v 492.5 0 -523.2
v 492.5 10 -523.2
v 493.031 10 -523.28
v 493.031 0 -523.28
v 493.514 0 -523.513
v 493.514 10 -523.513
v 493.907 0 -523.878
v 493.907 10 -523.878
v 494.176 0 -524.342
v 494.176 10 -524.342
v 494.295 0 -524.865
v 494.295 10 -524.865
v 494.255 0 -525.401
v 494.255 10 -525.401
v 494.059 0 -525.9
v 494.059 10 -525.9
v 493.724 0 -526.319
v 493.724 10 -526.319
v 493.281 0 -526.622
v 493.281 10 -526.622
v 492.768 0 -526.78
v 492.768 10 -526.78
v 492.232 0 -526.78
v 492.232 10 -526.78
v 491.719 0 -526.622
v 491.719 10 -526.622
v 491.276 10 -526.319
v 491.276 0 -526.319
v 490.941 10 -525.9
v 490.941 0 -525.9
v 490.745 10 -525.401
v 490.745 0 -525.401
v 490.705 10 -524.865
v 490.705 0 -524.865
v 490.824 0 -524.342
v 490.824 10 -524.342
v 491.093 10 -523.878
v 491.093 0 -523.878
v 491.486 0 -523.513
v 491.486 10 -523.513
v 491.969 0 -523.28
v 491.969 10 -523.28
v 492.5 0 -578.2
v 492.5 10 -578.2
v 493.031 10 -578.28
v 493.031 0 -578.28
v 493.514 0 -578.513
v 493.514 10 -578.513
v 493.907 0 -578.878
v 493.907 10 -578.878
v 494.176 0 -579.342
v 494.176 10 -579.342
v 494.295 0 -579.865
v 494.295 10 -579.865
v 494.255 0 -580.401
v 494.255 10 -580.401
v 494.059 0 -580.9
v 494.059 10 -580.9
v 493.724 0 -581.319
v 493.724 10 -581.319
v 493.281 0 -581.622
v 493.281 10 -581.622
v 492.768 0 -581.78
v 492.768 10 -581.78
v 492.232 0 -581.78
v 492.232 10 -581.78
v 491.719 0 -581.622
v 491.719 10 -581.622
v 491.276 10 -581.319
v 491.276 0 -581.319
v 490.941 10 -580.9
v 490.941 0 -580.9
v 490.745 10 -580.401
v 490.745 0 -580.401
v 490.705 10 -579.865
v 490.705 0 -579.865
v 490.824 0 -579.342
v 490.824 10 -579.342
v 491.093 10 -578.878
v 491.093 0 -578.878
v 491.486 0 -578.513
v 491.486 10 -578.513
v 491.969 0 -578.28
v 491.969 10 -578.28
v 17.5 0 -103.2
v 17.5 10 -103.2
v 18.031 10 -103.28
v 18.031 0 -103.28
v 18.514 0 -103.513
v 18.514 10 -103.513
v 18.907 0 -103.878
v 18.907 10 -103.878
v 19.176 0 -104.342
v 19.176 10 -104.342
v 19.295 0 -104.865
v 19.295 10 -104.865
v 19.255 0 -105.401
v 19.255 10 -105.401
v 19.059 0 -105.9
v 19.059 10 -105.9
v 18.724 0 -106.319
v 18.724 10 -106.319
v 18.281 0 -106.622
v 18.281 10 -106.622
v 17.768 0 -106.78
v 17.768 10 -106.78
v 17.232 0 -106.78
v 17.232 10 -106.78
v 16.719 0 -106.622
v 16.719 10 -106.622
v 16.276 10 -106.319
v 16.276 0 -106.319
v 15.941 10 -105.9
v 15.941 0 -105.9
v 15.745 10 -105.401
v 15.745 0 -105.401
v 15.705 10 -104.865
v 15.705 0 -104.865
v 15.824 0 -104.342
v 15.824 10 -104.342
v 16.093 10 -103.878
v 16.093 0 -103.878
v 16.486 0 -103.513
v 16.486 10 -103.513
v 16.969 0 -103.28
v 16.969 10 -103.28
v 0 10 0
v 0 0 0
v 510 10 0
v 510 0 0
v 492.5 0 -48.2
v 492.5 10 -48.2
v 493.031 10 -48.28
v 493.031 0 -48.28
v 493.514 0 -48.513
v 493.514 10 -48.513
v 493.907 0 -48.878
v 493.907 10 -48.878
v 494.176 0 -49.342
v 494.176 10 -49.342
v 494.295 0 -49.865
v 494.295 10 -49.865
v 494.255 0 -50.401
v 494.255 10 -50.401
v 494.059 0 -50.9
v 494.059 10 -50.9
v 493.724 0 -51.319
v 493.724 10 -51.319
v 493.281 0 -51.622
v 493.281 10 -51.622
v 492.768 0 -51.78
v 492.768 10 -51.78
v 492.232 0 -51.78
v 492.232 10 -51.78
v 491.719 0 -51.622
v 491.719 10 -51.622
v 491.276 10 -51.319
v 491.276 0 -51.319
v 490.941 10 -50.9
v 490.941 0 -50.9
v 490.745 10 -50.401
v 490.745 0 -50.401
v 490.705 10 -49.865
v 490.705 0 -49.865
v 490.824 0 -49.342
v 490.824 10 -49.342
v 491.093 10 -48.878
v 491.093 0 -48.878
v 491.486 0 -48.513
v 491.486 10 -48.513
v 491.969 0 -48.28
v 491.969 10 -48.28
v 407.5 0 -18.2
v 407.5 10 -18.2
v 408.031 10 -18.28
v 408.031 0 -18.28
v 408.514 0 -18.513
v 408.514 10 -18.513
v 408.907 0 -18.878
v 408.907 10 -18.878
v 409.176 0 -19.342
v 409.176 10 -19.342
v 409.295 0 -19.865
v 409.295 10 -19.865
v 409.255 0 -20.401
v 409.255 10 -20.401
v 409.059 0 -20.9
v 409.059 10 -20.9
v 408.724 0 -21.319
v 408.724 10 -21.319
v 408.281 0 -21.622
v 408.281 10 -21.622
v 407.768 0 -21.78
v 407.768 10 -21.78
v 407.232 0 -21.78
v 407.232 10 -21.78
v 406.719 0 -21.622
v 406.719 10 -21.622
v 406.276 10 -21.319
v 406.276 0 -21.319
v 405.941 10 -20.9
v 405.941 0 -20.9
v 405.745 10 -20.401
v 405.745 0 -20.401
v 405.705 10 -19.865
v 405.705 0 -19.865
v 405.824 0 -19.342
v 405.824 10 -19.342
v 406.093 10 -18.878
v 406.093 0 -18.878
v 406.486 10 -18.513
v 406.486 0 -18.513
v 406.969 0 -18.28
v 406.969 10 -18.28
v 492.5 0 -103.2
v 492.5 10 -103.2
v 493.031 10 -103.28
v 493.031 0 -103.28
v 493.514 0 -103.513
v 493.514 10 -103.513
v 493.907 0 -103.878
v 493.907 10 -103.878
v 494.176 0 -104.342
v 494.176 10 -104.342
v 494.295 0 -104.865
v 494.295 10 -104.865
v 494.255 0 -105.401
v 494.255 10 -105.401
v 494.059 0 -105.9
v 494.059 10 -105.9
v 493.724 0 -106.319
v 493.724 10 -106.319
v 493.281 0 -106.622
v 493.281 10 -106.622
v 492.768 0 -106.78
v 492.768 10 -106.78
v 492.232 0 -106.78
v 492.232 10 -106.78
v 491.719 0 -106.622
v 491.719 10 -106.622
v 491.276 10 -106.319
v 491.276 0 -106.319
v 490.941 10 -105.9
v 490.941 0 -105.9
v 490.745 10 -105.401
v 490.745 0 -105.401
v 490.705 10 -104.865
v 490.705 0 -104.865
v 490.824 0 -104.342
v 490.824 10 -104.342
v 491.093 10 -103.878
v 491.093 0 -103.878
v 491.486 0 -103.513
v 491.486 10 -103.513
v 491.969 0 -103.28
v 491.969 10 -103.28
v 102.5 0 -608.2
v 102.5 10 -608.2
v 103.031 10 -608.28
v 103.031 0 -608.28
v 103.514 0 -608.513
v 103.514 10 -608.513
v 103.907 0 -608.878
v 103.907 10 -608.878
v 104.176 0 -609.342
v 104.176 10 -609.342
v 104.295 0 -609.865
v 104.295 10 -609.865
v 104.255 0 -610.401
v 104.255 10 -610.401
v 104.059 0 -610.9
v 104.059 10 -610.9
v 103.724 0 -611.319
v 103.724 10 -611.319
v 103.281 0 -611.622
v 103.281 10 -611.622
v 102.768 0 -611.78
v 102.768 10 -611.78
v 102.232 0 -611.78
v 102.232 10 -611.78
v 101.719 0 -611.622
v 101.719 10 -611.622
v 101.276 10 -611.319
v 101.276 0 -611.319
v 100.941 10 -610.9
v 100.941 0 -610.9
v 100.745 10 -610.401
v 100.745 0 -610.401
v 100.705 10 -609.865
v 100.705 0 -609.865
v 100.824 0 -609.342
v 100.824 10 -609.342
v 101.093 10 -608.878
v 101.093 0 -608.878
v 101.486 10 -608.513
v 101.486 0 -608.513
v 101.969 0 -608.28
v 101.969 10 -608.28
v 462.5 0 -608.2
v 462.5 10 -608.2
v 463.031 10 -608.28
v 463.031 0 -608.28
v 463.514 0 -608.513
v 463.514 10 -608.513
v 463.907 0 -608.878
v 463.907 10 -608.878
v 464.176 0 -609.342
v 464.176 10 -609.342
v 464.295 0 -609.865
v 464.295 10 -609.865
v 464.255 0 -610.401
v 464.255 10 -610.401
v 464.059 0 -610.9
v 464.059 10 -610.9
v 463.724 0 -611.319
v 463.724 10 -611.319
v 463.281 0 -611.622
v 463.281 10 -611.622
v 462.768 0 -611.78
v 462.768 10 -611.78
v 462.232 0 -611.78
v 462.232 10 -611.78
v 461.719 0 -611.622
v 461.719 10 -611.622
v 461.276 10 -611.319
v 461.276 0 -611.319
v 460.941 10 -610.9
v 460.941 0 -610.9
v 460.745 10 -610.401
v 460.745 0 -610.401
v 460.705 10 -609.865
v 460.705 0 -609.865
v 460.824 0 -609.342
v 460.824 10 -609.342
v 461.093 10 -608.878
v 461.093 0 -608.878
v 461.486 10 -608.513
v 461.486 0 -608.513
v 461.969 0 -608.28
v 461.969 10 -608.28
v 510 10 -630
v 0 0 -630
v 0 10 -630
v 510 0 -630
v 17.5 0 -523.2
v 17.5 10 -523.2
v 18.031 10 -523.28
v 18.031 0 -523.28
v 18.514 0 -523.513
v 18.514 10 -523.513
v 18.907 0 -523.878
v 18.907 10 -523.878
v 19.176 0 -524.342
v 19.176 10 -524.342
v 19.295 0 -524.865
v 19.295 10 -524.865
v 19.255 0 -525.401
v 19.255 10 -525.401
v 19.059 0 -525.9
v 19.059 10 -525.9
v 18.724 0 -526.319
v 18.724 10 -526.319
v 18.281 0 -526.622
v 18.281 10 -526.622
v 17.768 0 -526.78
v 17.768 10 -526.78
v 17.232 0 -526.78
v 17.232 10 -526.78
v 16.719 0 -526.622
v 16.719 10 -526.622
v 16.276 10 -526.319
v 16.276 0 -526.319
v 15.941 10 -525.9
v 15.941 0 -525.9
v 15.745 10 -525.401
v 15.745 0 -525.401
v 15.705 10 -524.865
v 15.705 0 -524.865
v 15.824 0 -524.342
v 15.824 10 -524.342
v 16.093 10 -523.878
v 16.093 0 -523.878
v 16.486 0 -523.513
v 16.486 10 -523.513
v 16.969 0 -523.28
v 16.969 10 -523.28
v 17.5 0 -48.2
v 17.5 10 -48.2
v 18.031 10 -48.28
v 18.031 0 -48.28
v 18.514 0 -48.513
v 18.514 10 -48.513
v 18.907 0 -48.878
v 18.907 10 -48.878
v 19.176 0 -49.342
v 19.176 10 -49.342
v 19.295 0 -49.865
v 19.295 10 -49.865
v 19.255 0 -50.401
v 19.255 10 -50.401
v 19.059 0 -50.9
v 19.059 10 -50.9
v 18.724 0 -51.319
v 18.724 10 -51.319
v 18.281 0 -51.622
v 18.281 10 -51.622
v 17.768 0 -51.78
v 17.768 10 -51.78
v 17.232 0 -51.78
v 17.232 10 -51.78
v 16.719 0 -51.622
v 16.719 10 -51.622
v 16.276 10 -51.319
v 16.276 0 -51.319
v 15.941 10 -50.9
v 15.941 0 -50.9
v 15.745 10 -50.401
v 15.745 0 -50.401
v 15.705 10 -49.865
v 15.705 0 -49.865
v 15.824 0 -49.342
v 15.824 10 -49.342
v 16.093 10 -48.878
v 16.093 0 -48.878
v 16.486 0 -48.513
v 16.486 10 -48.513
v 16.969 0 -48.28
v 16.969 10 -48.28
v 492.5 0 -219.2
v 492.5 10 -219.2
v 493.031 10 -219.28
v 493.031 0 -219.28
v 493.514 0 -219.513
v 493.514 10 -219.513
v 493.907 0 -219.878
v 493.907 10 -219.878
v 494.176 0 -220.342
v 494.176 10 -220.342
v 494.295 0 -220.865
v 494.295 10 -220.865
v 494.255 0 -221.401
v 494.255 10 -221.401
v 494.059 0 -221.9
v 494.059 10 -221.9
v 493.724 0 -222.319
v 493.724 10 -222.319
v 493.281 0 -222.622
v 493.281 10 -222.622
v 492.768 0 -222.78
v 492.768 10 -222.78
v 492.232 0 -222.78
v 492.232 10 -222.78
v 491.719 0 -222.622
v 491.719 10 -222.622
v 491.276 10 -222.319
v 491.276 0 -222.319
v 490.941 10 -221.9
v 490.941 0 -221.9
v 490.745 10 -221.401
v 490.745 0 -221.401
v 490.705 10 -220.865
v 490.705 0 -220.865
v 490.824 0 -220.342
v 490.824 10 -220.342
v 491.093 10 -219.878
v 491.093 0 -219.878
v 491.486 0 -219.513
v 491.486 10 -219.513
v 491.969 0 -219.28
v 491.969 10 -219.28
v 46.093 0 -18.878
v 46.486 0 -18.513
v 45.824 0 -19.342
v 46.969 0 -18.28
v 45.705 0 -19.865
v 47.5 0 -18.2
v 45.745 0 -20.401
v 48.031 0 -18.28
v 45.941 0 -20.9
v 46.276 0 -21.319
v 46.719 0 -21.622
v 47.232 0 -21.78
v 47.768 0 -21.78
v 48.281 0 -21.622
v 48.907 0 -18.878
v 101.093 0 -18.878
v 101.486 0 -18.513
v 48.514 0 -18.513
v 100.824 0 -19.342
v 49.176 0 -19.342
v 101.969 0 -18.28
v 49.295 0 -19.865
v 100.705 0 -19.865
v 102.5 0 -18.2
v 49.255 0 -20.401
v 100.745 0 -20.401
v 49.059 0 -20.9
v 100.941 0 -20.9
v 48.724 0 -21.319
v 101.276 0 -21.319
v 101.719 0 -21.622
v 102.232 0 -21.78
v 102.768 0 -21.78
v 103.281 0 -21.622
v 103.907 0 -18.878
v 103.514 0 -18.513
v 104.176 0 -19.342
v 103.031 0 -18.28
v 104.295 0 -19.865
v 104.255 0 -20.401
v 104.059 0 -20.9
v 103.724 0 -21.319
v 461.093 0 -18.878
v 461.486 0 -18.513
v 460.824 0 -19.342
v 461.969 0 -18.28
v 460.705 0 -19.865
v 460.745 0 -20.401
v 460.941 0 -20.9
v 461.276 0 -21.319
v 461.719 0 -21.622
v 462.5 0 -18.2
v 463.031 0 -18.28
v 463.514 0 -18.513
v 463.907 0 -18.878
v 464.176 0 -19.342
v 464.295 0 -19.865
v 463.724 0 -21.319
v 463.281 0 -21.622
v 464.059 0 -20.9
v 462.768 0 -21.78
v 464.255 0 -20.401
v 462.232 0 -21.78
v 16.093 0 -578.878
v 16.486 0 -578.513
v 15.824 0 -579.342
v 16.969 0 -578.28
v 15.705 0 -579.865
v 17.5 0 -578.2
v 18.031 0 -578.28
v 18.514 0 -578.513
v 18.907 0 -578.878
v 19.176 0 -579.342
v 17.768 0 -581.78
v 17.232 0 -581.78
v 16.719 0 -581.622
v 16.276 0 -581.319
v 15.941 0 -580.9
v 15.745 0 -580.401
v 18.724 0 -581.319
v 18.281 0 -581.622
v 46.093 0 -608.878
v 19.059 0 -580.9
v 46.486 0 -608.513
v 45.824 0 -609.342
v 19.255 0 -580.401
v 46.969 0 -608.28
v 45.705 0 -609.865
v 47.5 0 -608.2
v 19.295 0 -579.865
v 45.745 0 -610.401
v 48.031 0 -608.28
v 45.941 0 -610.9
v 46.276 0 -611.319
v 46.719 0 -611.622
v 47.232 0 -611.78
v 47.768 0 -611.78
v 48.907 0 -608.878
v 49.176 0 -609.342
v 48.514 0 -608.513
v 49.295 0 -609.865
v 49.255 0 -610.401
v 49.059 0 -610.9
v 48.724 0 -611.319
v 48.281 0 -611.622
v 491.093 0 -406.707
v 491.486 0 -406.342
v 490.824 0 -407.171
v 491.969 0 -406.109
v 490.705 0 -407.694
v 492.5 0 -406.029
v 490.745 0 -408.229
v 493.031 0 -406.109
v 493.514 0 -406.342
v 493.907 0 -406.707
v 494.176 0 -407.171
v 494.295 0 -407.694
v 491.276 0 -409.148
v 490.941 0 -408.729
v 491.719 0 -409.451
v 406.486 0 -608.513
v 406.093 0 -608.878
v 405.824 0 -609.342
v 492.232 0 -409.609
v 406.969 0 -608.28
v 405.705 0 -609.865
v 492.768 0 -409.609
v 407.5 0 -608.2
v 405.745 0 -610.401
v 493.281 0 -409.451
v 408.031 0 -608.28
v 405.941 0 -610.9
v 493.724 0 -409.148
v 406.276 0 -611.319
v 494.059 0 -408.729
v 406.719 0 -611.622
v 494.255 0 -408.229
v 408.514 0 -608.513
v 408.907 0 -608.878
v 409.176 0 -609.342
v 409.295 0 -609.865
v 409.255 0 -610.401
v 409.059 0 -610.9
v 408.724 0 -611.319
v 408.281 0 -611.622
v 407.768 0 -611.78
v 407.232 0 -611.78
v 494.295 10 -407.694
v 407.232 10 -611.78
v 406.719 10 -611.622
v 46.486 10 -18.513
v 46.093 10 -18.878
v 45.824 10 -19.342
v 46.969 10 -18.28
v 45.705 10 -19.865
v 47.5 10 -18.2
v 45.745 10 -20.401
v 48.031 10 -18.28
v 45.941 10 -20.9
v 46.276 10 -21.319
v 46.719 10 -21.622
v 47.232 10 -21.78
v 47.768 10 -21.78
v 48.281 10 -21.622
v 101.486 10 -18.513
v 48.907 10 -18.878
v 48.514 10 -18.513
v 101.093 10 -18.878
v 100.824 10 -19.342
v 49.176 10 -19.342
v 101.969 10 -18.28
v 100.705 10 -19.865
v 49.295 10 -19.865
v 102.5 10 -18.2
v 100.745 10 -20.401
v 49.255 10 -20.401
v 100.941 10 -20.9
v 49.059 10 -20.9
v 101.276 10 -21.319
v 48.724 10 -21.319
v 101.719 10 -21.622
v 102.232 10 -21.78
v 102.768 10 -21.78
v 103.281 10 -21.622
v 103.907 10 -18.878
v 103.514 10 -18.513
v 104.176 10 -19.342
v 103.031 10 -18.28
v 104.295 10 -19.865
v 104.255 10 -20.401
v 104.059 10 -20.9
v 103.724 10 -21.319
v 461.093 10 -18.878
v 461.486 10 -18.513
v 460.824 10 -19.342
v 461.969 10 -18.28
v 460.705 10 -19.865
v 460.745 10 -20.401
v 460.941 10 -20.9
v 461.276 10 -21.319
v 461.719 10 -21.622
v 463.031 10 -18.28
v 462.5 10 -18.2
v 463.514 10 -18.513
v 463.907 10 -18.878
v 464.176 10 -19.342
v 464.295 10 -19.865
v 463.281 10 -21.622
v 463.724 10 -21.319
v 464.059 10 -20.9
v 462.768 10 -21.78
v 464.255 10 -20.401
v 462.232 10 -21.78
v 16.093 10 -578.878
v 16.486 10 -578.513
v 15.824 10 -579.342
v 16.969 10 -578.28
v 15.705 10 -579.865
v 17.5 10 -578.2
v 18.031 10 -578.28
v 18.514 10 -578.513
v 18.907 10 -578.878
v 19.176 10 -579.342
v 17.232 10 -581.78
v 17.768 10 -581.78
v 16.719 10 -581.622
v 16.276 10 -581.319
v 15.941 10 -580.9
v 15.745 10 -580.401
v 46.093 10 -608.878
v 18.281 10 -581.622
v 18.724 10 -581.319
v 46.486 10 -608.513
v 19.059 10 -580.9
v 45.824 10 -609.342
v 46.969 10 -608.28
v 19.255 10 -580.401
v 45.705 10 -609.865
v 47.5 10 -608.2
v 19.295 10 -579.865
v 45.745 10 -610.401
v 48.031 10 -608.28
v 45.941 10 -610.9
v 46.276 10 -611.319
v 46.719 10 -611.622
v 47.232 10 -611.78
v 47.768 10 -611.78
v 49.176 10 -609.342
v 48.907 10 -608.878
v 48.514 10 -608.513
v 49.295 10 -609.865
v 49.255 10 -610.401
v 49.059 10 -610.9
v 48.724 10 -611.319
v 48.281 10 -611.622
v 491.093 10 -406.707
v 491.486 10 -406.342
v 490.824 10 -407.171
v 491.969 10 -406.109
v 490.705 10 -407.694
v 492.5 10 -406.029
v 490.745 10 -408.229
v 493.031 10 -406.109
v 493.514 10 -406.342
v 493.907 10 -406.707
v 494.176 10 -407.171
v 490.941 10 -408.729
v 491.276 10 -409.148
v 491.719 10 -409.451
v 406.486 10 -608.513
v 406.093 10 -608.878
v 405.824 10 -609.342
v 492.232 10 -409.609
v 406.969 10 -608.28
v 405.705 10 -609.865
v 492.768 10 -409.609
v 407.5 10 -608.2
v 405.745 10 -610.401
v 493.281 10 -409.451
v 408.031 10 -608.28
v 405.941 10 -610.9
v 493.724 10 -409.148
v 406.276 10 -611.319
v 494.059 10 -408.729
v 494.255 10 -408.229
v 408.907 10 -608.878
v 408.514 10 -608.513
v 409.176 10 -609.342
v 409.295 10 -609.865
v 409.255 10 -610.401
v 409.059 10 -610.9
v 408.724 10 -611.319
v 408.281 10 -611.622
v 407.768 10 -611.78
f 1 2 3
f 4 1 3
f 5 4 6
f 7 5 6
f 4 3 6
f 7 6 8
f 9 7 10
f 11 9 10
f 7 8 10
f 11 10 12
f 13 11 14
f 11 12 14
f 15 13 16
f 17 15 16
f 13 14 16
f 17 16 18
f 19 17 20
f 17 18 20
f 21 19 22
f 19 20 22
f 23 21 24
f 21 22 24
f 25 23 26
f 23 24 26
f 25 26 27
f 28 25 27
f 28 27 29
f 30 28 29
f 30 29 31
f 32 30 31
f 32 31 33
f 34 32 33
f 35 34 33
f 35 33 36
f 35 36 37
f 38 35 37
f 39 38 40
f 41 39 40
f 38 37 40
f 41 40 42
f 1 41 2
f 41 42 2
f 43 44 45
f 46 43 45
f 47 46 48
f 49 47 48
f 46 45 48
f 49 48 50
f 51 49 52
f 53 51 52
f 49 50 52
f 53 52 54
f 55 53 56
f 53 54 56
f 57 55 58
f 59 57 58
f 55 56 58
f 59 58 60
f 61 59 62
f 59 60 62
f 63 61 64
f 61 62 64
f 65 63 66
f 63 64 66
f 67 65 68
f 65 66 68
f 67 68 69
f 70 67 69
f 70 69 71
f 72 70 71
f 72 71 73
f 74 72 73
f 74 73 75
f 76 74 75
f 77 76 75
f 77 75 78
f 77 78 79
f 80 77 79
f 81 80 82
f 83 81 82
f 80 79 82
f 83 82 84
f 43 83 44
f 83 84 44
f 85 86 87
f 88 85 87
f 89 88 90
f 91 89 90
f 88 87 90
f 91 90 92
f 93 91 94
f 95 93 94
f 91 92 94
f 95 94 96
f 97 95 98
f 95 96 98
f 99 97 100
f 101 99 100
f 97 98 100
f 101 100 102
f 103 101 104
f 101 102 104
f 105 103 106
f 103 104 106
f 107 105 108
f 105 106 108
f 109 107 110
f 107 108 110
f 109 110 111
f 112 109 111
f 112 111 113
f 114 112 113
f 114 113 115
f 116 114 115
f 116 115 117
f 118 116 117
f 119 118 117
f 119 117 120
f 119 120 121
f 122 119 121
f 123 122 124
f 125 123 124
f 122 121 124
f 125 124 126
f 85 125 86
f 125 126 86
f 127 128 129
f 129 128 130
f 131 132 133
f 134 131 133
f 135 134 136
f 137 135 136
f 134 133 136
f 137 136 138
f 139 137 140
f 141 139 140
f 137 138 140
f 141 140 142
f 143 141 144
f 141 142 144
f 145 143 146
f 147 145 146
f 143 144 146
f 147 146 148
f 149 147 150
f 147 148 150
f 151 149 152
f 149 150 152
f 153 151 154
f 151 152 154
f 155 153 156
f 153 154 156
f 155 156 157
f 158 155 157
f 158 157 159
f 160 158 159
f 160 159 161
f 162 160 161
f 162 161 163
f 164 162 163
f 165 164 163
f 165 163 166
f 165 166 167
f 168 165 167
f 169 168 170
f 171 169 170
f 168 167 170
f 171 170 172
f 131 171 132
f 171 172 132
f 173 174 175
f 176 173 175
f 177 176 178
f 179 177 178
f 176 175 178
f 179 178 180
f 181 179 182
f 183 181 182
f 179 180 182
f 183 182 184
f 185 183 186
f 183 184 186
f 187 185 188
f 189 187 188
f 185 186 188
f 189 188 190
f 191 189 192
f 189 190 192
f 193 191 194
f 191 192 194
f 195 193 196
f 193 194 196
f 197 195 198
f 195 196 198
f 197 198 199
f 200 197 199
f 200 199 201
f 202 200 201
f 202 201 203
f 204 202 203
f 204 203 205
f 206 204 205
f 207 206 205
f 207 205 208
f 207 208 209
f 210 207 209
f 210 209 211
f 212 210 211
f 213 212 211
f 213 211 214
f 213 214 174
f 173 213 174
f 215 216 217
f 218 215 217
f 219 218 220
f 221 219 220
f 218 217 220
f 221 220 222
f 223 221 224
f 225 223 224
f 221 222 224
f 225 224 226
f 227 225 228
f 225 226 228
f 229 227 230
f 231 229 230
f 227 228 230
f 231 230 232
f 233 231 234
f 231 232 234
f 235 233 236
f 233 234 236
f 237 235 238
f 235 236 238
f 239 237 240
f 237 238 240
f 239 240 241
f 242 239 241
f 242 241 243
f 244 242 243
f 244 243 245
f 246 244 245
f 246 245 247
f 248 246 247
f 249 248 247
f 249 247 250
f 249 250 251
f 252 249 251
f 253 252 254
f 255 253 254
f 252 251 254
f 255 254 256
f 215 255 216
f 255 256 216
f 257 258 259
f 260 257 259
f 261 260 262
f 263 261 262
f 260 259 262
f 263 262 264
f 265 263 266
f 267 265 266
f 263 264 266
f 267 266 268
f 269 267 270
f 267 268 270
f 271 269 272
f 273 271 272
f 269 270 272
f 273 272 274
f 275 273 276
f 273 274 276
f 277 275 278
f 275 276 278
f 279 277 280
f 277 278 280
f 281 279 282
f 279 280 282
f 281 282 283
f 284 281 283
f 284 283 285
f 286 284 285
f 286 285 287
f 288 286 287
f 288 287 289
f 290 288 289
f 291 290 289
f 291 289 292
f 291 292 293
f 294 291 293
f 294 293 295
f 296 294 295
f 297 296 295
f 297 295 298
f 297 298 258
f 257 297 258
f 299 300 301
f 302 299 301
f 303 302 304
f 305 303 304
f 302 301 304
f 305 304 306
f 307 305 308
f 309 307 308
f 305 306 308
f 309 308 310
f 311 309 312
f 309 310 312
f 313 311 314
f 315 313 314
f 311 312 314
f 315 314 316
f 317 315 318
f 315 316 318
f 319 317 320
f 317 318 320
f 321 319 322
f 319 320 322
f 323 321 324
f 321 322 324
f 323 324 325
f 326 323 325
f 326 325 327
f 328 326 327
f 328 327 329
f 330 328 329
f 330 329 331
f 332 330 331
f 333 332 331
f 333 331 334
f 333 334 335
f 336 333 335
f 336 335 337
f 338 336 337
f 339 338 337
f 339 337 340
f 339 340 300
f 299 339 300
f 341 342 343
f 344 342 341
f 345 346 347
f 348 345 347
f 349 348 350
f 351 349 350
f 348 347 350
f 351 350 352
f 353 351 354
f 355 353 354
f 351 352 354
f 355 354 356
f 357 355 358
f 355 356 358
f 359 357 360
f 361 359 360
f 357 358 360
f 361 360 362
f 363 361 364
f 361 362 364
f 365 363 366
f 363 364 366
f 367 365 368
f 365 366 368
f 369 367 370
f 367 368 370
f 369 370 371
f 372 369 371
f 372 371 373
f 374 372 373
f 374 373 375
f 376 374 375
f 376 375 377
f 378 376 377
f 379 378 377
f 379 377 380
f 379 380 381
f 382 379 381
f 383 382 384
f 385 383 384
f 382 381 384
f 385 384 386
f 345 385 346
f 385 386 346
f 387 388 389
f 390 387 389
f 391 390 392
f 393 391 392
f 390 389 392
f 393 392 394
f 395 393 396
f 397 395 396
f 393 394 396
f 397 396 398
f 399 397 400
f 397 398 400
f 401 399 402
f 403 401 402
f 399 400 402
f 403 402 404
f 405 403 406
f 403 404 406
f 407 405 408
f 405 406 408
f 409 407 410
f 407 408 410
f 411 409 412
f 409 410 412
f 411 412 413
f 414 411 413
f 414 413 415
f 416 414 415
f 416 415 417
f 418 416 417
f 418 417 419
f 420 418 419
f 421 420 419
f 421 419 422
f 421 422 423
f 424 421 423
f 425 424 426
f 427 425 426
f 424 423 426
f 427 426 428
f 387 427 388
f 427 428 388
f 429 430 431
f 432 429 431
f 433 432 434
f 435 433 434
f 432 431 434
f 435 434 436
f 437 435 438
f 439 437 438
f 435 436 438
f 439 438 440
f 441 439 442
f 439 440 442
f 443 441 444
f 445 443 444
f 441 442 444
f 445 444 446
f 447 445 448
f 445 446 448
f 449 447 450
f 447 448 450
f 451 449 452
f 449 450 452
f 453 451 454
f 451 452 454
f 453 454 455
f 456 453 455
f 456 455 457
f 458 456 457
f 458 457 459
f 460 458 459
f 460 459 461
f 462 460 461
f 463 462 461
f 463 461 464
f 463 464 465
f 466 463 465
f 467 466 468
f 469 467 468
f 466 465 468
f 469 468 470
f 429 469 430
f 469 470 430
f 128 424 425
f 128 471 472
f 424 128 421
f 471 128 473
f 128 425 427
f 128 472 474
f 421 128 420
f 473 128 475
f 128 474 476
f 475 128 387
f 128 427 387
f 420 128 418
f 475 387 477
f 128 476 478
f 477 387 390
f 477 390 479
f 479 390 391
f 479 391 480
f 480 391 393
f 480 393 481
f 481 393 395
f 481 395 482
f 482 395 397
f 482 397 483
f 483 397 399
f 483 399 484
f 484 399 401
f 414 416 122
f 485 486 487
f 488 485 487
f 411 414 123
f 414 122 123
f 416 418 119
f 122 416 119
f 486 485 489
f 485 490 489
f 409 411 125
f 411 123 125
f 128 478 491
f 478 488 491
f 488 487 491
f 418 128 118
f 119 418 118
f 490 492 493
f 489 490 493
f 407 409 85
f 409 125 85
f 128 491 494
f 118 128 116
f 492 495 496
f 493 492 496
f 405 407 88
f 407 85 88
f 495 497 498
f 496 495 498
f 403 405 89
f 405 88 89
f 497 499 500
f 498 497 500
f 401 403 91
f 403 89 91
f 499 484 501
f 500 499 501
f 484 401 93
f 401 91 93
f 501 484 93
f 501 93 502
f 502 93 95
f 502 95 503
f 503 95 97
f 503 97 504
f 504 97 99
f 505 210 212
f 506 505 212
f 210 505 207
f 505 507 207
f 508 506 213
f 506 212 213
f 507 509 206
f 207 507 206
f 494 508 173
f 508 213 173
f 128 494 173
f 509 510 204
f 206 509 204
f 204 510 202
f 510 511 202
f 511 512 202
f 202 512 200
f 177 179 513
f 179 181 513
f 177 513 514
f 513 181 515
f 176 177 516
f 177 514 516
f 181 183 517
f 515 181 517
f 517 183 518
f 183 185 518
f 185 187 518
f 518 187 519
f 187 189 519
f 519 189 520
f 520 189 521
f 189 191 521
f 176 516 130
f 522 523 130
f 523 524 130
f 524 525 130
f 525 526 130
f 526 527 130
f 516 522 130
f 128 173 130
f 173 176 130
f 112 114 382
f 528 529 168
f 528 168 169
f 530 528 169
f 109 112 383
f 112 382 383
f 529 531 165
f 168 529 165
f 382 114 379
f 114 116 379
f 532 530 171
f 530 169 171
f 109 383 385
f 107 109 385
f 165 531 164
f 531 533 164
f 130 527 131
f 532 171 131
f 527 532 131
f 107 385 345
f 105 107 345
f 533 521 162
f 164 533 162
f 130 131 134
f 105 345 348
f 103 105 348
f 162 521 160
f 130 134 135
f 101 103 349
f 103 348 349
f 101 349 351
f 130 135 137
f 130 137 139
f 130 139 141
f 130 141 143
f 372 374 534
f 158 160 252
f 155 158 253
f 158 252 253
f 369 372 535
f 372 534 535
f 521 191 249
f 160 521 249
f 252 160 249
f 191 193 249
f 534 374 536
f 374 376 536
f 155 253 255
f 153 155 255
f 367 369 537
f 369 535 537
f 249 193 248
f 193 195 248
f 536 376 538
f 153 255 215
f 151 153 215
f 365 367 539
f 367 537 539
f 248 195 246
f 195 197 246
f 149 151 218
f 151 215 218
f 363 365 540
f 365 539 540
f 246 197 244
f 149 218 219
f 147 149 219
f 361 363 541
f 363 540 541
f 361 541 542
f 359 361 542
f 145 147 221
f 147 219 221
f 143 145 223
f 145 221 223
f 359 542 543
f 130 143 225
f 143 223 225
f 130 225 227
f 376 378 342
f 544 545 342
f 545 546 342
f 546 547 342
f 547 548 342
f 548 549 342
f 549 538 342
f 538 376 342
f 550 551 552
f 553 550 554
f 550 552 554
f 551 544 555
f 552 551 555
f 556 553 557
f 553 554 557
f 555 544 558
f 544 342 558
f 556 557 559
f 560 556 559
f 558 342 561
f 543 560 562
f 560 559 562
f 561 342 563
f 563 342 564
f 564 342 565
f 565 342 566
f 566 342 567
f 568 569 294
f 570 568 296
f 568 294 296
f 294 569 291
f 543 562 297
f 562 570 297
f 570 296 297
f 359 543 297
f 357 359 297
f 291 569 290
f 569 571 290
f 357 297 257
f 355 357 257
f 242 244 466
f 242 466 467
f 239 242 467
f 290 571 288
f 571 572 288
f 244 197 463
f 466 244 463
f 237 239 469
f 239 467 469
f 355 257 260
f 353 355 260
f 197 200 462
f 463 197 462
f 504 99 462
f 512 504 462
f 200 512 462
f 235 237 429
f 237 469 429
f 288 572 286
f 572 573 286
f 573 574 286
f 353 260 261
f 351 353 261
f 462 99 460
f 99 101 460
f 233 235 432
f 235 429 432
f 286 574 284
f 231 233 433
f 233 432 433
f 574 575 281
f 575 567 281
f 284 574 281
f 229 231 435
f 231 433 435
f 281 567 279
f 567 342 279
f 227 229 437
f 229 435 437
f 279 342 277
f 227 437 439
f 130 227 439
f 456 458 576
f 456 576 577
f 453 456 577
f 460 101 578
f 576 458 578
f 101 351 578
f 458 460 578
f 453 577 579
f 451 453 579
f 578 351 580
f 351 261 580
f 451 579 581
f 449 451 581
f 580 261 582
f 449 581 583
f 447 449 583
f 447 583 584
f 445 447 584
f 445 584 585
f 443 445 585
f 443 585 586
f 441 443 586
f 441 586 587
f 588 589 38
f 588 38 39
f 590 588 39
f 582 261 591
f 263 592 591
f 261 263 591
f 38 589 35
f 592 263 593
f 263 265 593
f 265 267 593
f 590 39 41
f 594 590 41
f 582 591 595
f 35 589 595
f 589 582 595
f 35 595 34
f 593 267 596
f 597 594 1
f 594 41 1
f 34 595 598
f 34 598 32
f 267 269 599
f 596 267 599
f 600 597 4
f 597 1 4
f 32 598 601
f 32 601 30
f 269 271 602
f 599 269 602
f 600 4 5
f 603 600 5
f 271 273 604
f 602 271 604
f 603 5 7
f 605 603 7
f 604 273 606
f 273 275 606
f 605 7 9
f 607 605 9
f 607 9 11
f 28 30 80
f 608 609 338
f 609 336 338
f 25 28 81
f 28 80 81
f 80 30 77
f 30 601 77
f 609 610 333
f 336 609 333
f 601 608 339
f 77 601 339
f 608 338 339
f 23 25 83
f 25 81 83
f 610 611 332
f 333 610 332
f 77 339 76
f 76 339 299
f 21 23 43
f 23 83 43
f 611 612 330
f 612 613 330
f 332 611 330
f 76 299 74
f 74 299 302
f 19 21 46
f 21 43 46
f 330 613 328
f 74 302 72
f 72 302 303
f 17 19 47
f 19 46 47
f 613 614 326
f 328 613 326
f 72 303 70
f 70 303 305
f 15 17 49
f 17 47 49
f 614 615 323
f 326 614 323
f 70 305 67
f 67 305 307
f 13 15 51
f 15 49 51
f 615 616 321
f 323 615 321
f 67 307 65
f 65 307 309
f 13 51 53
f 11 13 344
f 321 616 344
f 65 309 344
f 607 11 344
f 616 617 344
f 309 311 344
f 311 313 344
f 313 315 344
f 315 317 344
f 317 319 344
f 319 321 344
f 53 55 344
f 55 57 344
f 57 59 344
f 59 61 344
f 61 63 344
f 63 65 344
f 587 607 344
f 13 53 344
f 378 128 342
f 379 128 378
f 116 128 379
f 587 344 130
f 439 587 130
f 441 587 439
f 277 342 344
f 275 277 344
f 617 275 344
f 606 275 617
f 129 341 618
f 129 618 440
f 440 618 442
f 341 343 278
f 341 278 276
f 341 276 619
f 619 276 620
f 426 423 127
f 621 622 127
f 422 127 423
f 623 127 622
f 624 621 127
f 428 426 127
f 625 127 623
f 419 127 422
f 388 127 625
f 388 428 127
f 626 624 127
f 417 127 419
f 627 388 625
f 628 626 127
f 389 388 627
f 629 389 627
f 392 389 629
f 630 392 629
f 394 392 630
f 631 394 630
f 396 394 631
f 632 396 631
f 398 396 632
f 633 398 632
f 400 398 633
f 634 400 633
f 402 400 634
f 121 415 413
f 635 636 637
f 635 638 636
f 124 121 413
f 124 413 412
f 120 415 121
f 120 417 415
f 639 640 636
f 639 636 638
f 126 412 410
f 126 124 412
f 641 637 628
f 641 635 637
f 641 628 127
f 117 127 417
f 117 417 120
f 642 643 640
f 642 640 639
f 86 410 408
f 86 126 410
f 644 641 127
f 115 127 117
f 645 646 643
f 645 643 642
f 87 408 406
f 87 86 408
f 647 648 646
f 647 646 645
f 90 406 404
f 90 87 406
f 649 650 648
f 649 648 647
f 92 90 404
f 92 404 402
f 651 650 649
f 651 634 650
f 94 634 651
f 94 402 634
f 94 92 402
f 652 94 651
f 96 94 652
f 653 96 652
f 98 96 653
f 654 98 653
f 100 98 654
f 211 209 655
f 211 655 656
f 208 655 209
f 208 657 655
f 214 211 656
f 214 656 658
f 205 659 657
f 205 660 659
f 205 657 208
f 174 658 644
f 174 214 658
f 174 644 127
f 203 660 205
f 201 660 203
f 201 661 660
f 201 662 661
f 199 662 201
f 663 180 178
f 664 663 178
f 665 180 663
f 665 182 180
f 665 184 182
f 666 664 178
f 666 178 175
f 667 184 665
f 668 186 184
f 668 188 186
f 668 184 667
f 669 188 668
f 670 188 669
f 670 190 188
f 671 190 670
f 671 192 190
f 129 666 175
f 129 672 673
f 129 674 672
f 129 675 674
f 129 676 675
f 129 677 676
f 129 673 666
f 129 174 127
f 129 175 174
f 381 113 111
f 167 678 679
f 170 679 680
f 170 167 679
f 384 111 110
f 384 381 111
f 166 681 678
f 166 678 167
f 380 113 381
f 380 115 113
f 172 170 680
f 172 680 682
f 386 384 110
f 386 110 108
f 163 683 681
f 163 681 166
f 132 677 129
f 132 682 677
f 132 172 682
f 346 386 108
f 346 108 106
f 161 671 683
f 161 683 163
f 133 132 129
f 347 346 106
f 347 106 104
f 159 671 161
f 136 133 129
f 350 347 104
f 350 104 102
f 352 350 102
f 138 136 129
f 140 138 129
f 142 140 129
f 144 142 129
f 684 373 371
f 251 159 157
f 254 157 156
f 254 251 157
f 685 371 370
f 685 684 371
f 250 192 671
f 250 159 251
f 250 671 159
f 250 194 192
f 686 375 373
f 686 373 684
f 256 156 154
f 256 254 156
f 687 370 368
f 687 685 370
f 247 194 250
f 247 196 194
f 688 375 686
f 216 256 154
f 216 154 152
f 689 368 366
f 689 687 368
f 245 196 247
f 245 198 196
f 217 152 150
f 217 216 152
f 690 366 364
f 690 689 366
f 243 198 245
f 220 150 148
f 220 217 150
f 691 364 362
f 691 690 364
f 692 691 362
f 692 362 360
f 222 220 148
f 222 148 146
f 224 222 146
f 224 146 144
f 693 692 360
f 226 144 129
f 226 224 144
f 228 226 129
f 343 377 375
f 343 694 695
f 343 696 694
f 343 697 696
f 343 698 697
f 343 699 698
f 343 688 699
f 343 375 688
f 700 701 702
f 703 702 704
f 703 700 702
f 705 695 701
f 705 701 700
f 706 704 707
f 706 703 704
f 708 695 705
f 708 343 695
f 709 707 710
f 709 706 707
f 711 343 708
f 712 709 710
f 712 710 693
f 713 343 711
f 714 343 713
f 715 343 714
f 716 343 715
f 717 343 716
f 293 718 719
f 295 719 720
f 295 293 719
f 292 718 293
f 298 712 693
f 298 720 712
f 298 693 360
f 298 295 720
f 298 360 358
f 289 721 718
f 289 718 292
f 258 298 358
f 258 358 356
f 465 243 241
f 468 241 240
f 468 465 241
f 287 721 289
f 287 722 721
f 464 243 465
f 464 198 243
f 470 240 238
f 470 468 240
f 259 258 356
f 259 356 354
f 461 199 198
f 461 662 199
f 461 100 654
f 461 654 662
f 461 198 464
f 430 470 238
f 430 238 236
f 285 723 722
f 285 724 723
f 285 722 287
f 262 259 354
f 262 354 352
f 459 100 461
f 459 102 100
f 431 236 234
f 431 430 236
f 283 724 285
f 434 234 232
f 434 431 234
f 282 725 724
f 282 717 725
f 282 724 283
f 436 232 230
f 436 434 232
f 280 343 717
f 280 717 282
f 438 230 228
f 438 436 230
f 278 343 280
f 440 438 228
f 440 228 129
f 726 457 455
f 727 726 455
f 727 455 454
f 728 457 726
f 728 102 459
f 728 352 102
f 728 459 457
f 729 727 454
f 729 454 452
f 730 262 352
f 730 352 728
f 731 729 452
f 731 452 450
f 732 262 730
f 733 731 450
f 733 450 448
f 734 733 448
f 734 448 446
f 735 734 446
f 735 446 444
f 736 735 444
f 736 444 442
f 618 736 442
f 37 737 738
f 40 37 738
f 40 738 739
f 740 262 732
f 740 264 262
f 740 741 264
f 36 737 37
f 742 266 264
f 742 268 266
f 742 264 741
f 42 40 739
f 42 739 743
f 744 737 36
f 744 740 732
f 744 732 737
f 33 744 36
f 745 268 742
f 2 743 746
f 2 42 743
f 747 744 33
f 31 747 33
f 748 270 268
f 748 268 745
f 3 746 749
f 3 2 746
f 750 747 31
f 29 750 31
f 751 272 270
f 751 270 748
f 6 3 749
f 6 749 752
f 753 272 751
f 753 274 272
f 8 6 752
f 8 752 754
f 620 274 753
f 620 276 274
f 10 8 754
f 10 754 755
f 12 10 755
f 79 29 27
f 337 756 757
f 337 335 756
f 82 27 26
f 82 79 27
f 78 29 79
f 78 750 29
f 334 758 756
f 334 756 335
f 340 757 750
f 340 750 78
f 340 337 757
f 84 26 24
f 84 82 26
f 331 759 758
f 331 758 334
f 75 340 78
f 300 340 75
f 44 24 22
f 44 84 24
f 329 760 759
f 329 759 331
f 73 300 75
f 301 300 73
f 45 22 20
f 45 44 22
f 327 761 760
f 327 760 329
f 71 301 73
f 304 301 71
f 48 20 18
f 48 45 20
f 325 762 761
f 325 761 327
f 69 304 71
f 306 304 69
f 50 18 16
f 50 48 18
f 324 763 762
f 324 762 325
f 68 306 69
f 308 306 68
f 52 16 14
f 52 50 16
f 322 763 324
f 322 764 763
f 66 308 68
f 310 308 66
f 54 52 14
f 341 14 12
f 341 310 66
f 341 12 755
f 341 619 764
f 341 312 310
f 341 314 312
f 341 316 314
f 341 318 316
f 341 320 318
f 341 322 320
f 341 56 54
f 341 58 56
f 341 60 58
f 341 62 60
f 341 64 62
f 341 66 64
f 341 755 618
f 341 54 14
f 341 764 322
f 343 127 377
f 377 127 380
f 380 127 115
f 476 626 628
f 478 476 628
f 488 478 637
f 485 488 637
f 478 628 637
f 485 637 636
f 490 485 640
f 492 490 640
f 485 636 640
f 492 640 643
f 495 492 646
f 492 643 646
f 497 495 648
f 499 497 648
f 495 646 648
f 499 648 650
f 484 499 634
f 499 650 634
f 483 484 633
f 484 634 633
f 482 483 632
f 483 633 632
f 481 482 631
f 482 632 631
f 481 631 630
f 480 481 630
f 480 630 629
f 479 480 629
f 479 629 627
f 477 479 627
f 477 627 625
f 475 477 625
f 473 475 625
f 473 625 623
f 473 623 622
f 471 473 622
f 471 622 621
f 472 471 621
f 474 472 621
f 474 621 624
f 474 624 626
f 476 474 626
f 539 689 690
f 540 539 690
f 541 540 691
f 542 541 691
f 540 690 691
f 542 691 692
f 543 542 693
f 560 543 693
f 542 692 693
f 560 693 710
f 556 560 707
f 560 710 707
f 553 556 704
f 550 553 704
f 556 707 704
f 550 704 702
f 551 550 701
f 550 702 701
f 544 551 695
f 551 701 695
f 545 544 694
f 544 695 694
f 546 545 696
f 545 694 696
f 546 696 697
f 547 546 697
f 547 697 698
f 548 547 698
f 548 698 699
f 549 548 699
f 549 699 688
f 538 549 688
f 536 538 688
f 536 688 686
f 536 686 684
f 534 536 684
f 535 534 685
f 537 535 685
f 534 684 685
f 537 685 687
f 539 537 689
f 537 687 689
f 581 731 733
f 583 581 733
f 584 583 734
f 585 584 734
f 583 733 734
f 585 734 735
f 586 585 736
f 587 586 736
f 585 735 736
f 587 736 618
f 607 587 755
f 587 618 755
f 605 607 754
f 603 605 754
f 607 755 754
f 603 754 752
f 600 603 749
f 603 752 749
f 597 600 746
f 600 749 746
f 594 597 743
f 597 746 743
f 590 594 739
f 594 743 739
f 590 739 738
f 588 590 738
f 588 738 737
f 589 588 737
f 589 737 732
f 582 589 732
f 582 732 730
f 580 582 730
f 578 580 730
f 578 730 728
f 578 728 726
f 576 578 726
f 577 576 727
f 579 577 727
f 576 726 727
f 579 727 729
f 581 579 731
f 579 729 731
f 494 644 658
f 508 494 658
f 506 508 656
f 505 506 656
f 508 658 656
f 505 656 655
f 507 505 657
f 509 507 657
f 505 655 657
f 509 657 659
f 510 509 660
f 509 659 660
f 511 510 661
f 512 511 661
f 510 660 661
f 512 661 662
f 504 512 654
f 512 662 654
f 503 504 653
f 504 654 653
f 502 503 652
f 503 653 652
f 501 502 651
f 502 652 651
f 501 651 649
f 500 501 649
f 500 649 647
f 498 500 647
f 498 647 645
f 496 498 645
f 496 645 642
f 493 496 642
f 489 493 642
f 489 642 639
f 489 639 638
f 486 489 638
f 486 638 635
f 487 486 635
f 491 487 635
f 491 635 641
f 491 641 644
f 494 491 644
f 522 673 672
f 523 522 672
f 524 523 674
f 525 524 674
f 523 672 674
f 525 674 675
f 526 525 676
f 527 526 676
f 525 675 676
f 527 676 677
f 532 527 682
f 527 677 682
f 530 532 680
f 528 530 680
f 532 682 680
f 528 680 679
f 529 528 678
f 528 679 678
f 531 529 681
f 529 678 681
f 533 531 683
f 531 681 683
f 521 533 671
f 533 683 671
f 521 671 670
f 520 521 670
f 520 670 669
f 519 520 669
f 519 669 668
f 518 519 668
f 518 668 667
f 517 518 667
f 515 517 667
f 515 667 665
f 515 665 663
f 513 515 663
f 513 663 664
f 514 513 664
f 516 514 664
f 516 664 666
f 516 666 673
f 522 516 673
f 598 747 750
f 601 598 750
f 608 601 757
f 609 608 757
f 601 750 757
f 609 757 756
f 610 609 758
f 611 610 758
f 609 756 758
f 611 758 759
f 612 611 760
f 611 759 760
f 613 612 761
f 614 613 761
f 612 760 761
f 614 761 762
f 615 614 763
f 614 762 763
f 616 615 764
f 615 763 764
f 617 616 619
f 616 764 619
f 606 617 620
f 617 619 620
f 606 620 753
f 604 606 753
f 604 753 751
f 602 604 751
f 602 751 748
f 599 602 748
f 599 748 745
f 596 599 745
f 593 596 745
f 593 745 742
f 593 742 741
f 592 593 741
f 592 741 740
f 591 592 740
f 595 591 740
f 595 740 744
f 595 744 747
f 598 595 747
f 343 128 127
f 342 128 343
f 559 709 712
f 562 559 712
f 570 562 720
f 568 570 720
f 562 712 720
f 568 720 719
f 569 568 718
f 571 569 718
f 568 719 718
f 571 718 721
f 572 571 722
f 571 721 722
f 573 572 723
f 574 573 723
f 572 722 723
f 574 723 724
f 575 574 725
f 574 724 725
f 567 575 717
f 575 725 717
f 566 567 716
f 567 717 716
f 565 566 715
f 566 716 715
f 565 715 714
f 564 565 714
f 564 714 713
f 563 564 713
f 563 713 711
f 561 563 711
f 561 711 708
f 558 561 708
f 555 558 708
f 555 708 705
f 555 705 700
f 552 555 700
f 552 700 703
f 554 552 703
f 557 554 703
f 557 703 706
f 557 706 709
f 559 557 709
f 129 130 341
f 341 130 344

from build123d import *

# Parameters (mm, degrees)
SKETCH1_W           = 510
SKETCH1_H           = 630
BOSS_EXTRUDE1_DEPTH = 10
SKETCH2_R           = 1.8
CUT_EXTRUDE1_DEPTH  = 10
SKETCH3_R           = 1.8
CUT_EXTRUDE2_DEPTH  = 10
SKETCH4_R           = 1.8
CUT_EXTRUDE3_DEPTH  = 12.1


with BuildPart() as part:
    # Sketch1 → Boss-Extrude1 (new body)
    with BuildSketch(Plane(origin=(0, 0, 0), x_dir=(1, 0, 0), z_dir=(0, 1, 0))):
        with Locations((255, 315)):
            Rectangle(SKETCH1_W, SKETCH1_H)
    extrude(amount=BOSS_EXTRUDE1_DEPTH)

    # Sketch2 → Cut-Extrude1 (cut)
    with BuildSketch(Plane(origin=(0, 10, 0), x_dir=(1, 0, 0), z_dir=(0, 1, 0))):
        with Locations(Location((492.5, 50, 0), (0, 0, 270))):
            Circle(SKETCH2_R)
        with Locations(Location((492.5, 105, 0), (0, 0, 270))):
            Circle(SKETCH2_R)
        with Locations(Location((492.5, 580, 0), (0, 0, 270))):
            Circle(SKETCH2_R)
        with Locations(Location((492.5, 525, 0), (0, 0, 270))):
            Circle(SKETCH2_R)
        with Locations(Location((492.5, 407.828802922, 0), (0, 0, 270))):
            Circle(SKETCH2_R)
        with Locations(Location((492.5, 221, 0), (0, 0, 270))):
            Circle(SKETCH2_R)
    extrude(amount=-CUT_EXTRUDE1_DEPTH, mode=Mode.SUBTRACT)

    # Sketch3 → Cut-Extrude2 (cut)
    with BuildSketch(Plane(origin=(0, 10, 0), x_dir=(1, 0, 0), z_dir=(0, 1, 0))):
        with Locations(Location((17.5, 50, 0), (0, 0, 270))):
            Circle(SKETCH3_R)
        with Locations(Location((17.5, 105, 0), (0, 0, 270))):
            Circle(SKETCH3_R)
        with Locations(Location((17.5, 525, 0), (0, 0, 270))):
            Circle(SKETCH3_R)
        with Locations(Location((17.5, 580, 0), (0, 0, 270))):
            Circle(SKETCH3_R)
    extrude(amount=-CUT_EXTRUDE2_DEPTH, mode=Mode.SUBTRACT)

    # Sketch4 → Cut-Extrude3 (cut)
    with BuildSketch(Plane(origin=(0, 10, 0), x_dir=(1, 0, 0), z_dir=(0, 1, 0))):
        with Locations(Location((47.5, 610, 0), (0, 0, 270))):
            Circle(SKETCH4_R)
        with Locations(Location((102.5, 610, 0), (0, 0, 270))):
            Circle(SKETCH4_R)
        with Locations(Location((407.5, 610, 0), (0, 0, 270))):
            Circle(SKETCH4_R)
        with Locations(Location((462.5, 610, 0), (0, 0, 270))):
            Circle(SKETCH4_R)
        with Locations(Location((462.5, 20, 0), (0, 0, 270))):
            Circle(SKETCH4_R)
        with Locations(Location((407.5, 20, 0), (0, 0, 270))):
            Circle(SKETCH4_R)
        with Locations(Location((102.5, 20, 0), (0, 0, 270))):
            Circle(SKETCH4_R)
        with Locations(Location((47.5, 20, 0), (0, 0, 270))):
            Circle(SKETCH4_R)
    extrude(amount=-CUT_EXTRUDE3_DEPTH, mode=Mode.SUBTRACT)


solid = part.part
